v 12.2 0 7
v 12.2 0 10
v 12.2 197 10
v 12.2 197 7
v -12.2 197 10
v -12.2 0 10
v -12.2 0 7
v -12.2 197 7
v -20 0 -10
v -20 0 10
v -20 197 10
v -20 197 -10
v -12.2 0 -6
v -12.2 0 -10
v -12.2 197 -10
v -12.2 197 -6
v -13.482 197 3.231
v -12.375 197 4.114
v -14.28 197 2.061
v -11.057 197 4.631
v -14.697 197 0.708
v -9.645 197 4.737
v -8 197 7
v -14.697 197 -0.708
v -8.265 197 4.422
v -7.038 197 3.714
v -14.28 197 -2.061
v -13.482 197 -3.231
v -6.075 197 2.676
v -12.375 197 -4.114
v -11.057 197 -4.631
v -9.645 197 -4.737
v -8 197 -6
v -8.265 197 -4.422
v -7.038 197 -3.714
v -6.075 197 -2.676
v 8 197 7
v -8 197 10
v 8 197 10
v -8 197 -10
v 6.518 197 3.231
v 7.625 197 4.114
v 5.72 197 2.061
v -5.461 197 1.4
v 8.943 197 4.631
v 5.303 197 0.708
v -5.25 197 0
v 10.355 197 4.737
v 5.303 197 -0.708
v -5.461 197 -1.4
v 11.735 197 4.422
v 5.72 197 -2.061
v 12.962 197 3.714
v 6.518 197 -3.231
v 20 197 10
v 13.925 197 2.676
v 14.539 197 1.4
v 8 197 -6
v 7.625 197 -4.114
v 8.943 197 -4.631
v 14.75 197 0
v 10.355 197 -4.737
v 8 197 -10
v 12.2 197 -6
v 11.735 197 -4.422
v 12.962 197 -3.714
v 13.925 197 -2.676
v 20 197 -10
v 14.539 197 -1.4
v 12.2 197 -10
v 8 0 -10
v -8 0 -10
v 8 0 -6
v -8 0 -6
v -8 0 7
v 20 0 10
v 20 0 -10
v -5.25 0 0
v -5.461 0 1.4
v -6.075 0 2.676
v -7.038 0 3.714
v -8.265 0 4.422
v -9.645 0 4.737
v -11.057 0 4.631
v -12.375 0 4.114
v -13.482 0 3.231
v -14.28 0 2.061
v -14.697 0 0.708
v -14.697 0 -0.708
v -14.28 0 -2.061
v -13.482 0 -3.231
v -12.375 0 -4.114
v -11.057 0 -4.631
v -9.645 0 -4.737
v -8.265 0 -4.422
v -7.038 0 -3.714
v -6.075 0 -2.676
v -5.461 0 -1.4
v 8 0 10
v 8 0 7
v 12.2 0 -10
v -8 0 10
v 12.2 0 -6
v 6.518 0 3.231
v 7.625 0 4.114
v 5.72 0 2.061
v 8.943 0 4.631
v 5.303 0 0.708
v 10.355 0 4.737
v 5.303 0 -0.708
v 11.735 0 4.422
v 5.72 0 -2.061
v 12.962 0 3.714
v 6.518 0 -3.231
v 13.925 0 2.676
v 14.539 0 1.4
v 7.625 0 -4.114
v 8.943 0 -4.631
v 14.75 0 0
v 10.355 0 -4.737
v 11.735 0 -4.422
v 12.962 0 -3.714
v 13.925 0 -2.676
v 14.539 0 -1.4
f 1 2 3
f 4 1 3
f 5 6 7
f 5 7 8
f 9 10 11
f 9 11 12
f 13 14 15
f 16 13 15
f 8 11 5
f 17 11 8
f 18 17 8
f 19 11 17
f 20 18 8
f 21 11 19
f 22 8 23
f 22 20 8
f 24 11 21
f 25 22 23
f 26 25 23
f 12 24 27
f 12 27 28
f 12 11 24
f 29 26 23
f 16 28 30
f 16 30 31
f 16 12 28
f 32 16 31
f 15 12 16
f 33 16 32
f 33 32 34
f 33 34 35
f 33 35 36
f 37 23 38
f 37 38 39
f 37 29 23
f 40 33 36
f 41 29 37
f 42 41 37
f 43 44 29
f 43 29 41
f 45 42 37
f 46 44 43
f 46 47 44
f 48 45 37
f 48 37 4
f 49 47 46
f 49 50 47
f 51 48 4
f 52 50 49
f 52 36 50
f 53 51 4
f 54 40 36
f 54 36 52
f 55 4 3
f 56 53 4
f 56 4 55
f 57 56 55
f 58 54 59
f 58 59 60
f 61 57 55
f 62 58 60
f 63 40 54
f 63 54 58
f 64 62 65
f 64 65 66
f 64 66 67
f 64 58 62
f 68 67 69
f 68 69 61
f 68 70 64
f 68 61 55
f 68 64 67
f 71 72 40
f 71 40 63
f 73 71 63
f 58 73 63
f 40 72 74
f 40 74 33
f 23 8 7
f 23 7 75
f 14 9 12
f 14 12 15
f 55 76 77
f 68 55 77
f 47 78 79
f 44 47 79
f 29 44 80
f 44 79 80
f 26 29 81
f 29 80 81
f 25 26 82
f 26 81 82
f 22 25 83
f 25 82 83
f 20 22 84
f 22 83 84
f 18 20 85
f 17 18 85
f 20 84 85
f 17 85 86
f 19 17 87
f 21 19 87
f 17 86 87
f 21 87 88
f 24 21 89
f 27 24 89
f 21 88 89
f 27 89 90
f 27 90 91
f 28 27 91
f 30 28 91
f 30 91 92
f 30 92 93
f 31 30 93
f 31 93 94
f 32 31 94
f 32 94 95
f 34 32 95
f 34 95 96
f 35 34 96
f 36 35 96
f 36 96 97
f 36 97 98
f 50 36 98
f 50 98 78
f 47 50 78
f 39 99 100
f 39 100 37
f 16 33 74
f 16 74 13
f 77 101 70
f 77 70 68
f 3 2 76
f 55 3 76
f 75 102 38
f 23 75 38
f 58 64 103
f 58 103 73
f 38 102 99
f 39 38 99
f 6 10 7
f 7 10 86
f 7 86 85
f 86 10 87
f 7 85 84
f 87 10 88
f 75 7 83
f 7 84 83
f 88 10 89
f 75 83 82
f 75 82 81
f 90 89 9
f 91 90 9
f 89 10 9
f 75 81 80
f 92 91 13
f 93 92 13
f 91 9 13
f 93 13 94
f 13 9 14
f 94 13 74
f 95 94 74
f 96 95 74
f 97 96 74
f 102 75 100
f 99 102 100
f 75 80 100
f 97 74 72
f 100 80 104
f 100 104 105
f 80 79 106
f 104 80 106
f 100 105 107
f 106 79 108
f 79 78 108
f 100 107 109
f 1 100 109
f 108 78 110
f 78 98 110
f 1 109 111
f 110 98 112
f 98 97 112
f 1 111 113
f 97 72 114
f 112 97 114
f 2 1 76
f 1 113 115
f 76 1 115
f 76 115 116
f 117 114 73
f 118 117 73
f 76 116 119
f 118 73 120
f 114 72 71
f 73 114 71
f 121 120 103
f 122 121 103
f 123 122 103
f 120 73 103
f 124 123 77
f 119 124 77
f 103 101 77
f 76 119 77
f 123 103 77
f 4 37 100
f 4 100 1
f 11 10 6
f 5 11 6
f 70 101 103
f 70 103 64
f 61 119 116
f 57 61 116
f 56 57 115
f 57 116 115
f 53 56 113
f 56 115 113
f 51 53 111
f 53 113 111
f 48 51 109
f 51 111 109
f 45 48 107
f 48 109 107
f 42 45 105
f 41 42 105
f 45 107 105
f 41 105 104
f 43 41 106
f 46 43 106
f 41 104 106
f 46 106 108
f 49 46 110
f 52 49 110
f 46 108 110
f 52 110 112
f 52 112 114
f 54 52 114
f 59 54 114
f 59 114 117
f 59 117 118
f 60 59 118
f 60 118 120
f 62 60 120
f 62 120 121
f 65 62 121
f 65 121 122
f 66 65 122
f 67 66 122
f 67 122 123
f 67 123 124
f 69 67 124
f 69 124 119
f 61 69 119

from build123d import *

# Parameters (mm, degrees)
SKETCH_2_W          = 40
SKETCH_2_H          = 20
EXTRUDE_1_DEPTH     = 197
SKETCH_3_R          = 4.75
CUT_EXTRUDE_1_DEPTH = 198
SKETCH_4_W          = 4.2
SKETCH_4_H          = 197
CUT_EXTRUDE_2_DEPTH = 3
SKETCH_5_W          = 4.2
SKETCH_5_H          = 197
CUT_EXTRUDE_3_DEPTH = 4


with BuildPart() as part:
    # 草图2 → 凸台-拉伸1 (new body)
    with BuildSketch(Plane(origin=(0, 0, 0), x_dir=(1, 0, 0), z_dir=(0, 1, 0))):
        Rectangle(SKETCH_2_W, SKETCH_2_H)
    extrude(amount=EXTRUDE_1_DEPTH)

    # 草图3 → 切除-拉伸1 (cut, through all)
    with BuildSketch(Plane.XZ):
        with Locations((-10, 0)):
            Circle(SKETCH_3_R)
        with Locations((10, 0)):
            Circle(SKETCH_3_R)
    extrude(amount=-CUT_EXTRUDE_1_DEPTH, mode=Mode.SUBTRACT)

    # 草图4 → 切除-拉伸2 (cut)
    with BuildSketch(Plane.XY.offset(10)):
        with Locations((-10.1, 98.5)):
            Rectangle(SKETCH_4_W, SKETCH_4_H)
        with Locations((10.1, 98.5)):
            Rectangle(SKETCH_4_W, SKETCH_4_H)
    extrude(amount=-CUT_EXTRUDE_2_DEPTH, mode=Mode.SUBTRACT)

    # 草图5 → 切除-拉伸3 (cut)
    with BuildSketch(Plane(origin=(0, 0, -10), x_dir=(-1, 0, 0), z_dir=(0, 0, -1))):
        with Locations((-10.1, 98.5)):
            Rectangle(SKETCH_5_W, SKETCH_5_H)
        with Locations((10.1, 98.5)):
            Rectangle(SKETCH_5_W, SKETCH_5_H)
    extrude(amount=-CUT_EXTRUDE_3_DEPTH, mode=Mode.SUBTRACT)


solid = part.part
